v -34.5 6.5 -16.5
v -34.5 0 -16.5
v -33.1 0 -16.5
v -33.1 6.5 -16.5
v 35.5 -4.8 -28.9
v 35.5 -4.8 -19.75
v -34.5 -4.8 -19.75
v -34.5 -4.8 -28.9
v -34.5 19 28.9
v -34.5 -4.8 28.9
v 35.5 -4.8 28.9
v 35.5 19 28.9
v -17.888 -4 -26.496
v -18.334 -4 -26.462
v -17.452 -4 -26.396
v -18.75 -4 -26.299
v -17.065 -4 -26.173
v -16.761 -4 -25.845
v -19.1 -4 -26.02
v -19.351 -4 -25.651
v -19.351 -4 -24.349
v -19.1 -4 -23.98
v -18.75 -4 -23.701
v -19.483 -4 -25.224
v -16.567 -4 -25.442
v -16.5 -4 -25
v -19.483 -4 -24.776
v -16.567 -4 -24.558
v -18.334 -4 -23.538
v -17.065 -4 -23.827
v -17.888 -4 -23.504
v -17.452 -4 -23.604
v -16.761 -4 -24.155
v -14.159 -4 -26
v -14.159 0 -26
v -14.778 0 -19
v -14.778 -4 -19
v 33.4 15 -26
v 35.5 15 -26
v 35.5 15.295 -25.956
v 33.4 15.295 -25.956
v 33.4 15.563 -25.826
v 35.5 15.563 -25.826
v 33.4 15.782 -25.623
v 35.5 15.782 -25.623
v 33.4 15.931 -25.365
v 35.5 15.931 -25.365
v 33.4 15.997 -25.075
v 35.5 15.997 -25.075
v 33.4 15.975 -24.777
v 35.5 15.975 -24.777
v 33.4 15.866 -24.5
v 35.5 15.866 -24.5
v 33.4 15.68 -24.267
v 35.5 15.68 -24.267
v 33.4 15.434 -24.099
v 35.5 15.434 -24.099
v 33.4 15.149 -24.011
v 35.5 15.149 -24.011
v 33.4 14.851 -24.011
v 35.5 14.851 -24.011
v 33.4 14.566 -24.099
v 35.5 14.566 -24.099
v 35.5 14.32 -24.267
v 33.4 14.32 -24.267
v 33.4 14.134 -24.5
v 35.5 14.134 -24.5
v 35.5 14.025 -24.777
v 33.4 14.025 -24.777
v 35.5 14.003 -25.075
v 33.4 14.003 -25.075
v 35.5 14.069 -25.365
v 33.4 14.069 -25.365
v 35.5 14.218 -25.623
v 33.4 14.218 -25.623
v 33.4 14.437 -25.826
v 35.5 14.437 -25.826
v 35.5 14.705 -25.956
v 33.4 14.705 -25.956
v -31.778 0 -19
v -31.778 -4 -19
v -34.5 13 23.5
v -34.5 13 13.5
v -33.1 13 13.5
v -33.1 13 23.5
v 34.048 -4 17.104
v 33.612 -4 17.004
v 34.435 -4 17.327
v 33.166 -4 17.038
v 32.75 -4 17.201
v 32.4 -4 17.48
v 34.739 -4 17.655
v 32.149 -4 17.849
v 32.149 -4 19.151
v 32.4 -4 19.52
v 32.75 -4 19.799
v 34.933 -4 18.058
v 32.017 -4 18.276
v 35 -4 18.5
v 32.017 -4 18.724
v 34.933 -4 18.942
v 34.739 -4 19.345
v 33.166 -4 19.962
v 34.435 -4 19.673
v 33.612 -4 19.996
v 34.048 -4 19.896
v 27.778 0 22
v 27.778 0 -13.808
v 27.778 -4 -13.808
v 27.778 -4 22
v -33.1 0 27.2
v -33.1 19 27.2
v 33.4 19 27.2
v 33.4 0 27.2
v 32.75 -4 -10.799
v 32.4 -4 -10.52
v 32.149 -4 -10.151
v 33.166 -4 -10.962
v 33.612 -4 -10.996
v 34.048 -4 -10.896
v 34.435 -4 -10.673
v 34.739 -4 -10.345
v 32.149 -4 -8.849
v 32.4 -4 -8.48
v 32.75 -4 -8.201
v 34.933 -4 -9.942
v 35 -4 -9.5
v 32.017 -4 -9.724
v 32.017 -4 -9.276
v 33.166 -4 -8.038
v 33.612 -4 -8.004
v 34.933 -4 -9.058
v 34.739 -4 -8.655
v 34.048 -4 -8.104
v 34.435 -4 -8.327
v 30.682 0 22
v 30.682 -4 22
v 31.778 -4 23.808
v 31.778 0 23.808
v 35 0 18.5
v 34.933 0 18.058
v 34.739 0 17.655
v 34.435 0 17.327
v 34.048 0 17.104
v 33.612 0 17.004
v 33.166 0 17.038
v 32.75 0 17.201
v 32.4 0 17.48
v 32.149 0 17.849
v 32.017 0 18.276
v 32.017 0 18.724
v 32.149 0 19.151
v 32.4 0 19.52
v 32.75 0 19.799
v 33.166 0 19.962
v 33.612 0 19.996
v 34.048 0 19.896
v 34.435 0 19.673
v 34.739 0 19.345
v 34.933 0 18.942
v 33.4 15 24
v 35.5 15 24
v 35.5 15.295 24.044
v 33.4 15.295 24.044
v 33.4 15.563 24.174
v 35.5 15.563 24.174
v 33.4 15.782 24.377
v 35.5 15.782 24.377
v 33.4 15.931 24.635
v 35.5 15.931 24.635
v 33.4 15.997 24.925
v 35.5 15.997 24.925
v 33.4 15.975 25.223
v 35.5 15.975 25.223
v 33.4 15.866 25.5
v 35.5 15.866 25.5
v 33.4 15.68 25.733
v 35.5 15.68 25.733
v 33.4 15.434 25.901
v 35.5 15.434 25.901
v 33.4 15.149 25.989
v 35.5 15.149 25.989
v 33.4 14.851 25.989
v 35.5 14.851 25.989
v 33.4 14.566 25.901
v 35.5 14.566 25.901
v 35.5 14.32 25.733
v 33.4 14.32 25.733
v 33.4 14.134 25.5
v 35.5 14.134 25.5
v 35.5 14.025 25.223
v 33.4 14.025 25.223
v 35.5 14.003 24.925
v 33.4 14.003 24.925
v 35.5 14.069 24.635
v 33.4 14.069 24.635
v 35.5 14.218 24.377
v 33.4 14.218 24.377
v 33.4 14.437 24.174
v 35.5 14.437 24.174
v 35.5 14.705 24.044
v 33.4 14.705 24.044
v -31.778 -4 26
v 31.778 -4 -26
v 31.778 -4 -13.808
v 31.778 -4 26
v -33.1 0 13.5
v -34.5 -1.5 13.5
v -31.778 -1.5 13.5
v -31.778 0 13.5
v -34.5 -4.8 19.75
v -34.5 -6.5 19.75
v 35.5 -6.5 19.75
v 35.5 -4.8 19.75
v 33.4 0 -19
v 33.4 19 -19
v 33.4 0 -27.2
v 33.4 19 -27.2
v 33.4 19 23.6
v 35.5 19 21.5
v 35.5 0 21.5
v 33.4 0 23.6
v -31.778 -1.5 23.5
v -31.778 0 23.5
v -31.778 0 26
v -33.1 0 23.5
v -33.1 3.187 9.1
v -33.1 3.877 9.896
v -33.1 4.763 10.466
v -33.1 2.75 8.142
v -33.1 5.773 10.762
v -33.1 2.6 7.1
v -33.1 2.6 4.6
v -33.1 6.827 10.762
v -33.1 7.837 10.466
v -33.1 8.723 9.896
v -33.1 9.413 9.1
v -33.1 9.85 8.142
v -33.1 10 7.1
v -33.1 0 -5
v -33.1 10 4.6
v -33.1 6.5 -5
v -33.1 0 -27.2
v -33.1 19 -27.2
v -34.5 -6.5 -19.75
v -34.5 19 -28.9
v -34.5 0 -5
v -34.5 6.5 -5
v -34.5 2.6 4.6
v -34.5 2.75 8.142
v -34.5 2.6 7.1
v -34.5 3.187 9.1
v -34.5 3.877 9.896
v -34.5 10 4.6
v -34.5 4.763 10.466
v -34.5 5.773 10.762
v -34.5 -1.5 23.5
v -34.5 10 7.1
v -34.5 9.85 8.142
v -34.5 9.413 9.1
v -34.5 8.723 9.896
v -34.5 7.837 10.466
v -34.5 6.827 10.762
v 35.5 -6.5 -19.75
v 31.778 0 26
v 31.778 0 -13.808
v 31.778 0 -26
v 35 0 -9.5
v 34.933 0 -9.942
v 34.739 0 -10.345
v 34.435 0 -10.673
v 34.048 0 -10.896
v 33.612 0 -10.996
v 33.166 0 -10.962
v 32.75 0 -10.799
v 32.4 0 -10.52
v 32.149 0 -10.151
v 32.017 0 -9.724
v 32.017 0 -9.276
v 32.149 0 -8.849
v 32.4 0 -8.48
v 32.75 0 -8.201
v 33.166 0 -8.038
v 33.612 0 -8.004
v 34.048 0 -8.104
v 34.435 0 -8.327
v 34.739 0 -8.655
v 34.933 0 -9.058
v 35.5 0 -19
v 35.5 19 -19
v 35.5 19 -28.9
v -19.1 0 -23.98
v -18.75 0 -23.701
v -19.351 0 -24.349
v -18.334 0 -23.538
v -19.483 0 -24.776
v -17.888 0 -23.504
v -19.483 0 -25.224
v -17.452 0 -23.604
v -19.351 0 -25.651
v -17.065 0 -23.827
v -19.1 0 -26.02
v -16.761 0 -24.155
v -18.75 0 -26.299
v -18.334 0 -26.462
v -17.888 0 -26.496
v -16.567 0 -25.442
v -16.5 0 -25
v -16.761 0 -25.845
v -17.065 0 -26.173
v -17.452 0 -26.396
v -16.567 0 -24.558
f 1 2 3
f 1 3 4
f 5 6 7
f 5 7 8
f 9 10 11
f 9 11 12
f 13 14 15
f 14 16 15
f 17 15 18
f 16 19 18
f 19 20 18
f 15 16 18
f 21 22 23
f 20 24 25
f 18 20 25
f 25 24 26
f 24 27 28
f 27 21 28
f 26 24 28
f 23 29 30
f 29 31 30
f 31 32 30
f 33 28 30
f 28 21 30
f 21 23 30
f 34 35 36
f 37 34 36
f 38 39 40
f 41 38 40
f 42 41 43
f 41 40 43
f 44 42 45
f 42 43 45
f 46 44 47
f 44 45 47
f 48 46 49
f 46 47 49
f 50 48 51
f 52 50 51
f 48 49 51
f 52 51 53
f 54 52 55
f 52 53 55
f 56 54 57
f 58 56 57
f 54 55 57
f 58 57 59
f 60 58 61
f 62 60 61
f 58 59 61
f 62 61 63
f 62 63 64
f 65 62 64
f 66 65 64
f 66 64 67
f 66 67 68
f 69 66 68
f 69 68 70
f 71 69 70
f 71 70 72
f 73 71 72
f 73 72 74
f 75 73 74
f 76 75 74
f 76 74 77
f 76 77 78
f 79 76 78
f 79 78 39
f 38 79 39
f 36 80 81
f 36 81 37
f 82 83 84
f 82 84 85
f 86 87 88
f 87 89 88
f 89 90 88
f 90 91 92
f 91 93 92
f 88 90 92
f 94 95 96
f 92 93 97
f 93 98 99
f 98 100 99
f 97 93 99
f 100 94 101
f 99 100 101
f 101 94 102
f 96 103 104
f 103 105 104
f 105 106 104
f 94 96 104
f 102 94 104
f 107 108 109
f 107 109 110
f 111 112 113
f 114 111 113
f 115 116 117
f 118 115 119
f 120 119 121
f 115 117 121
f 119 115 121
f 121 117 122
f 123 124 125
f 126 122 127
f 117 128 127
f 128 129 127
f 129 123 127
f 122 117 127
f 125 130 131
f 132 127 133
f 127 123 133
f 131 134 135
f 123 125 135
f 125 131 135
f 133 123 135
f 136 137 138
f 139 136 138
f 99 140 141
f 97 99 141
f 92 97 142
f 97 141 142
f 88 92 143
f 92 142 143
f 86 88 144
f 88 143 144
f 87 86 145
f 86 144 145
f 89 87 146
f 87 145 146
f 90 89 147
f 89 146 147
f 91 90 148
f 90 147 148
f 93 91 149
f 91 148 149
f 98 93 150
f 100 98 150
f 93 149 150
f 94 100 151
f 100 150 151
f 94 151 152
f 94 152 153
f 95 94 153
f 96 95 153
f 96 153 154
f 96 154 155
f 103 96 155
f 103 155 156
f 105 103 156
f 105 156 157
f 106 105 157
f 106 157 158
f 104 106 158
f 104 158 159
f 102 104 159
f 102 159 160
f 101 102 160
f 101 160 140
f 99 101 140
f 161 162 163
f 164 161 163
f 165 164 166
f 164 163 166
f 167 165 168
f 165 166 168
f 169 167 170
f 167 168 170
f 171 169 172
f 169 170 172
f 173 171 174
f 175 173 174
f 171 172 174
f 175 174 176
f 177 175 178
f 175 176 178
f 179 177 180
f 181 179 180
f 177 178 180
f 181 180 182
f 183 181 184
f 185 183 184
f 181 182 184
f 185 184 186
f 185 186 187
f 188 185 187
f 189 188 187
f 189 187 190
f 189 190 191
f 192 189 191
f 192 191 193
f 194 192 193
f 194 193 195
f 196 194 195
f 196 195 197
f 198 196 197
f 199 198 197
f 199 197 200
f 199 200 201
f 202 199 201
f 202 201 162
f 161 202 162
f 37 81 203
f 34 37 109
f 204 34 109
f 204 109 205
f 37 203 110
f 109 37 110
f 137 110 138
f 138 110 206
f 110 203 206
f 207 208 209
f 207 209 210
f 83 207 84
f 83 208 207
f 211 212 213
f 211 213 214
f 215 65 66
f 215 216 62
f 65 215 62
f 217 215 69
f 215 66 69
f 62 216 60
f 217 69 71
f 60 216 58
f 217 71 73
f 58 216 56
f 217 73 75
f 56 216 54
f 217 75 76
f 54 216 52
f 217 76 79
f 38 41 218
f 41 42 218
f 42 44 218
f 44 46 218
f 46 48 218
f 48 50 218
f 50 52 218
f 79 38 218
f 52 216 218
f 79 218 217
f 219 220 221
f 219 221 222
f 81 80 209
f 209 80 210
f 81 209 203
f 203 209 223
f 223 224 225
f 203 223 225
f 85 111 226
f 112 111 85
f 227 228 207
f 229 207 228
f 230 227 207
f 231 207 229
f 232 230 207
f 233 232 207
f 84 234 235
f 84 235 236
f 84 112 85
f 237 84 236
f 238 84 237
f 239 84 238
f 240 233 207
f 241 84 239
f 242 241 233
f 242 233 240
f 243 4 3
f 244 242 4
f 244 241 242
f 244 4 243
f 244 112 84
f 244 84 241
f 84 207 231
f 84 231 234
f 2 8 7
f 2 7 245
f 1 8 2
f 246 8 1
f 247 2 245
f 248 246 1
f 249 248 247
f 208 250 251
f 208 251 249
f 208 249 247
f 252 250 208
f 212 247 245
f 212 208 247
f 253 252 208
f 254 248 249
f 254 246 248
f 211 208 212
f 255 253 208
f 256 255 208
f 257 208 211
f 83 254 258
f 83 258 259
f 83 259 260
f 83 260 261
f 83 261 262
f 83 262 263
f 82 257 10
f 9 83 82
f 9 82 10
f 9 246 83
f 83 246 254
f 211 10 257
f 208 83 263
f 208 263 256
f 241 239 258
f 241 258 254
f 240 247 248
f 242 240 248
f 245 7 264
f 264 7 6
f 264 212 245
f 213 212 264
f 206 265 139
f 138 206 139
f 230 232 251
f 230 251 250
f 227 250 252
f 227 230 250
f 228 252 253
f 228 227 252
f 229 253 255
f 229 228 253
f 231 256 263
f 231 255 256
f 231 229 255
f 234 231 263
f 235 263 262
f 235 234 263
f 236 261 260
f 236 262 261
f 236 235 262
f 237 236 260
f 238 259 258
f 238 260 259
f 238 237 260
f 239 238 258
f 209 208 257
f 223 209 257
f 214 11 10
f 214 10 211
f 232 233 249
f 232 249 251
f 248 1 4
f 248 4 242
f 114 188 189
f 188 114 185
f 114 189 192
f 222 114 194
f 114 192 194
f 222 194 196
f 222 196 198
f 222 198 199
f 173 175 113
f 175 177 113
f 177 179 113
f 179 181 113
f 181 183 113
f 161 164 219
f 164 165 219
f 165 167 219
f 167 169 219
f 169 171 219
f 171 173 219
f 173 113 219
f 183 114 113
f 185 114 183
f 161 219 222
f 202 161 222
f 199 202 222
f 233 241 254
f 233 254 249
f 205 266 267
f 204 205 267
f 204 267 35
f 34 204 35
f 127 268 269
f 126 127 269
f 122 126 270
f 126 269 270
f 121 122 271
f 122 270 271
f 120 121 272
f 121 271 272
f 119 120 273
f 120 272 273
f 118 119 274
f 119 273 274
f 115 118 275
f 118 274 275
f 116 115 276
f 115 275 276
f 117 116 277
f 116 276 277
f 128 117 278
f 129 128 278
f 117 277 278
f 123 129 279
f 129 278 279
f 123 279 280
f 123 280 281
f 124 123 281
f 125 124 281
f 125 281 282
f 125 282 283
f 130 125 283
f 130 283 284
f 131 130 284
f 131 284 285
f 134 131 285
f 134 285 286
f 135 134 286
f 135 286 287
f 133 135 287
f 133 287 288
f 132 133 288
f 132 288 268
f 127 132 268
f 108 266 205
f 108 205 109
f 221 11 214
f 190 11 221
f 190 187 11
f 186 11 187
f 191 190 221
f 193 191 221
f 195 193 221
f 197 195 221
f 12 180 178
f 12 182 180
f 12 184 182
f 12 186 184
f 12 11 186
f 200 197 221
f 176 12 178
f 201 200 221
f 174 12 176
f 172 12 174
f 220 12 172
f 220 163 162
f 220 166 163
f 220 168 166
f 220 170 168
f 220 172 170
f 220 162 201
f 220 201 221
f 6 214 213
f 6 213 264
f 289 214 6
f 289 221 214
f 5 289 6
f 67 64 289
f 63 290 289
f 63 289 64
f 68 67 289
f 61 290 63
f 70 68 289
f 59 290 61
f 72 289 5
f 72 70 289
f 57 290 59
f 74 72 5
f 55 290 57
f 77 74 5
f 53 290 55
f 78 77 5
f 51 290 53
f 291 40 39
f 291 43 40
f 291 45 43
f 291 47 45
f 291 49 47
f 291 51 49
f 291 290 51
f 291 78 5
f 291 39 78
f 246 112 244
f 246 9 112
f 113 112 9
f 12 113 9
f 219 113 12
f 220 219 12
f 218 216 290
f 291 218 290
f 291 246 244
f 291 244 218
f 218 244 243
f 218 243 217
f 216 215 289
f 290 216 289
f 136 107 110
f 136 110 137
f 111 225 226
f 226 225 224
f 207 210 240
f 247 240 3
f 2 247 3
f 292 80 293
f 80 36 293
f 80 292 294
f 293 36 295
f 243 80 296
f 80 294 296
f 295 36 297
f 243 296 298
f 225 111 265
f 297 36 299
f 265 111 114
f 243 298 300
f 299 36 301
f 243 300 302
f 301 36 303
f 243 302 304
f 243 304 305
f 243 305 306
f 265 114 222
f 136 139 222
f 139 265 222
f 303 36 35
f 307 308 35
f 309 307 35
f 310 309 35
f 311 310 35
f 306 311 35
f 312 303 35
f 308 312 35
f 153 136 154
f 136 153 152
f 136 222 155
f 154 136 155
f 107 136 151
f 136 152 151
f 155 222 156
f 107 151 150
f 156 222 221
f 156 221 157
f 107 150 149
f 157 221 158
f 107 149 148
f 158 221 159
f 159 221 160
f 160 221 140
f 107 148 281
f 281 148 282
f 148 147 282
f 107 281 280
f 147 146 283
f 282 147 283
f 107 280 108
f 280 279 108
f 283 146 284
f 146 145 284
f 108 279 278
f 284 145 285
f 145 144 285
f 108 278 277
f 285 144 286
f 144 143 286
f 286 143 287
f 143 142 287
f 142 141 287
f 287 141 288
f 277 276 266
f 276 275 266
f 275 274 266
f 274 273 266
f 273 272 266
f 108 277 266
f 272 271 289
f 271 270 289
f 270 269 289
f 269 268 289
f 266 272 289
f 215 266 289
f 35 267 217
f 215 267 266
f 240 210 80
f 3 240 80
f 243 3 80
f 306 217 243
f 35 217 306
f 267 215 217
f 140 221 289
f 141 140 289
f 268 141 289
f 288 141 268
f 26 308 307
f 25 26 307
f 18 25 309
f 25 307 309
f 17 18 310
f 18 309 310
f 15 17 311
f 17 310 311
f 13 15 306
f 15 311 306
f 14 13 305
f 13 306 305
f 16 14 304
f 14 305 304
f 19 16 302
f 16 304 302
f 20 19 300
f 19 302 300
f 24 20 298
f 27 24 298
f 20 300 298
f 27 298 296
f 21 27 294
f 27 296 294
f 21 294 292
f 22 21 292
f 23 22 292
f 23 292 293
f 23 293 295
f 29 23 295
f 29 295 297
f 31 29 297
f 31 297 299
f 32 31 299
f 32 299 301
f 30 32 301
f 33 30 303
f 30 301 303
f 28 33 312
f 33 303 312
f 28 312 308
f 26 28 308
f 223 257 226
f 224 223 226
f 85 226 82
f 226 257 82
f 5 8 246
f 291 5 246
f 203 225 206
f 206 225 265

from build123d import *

# Parameters (mm, degrees)
EXTRUDE_1_DEPTH      = 4
SKETCH_3_W           = 73
SKETCH_3_H           = 58
EXTRUDE_2_DEPTH      = 13
EXTRUDE_2_DEPTH_BACK = 4
SKETCH_4_W           = 17
SKETCH_4_H           = 7
EXTRUDE_4_DEPTH      = 4
SKETCH_5_R           = 1.5
CUT_EXTRUDE_1_DEPTH  = 4
EXTRUDE_5_DEPTH      = 4
EXTRUDE_6_DEPTH      = 4
SKETCH_8_W           = 73
SKETCH_8_H           = 58
EXTRUDE_7_DEPTH      = 1
SKETCH_9_W           = 8.5
SKETCH_9_H           = 3.5
CUT_EXTRUDE_2_DEPTH  = 2
CHAMFER_1_SIZE       = 0.5
SKETCH_10_W          = 9
SKETCH_10_H          = 12
CUT_EXTRUDE_3_DEPTH  = 2
CHAMFER_2_SIZE       = 0.5
CHAMFER_3_SIZE       = 0.5
CHAMFER_4_SIZE       = 0.5
CUT_EXTRUDE_4_DEPTH  = 2
CHAMFER_5_SIZE       = 0.5
CHAMFER_6_SIZE       = 0.5
SKETCH_21_W          = 2
SKETCH_21_H          = 58
CUT_EXTRUDE_5_DEPTH  = 19
CUT_EXTRUDE_7_DEPTH  = 13
EXTRUDE_8_DEPTH      = 6
SKETCH_36_W          = 71
SKETCH_36_H          = 39.5
EXTRUDE_9_DEPTH      = 1.5
SKETCH_39_R          = 1
CUT_EXTRUDE_9_DEPTH  = 5
SKETCH_42_W          = 9.25
SKETCH_42_H          = 0.2
CUT_EXTRUDE_10_DEPTH = 72
SKETCH_43_W          = 0.1
SKETCH_43_H          = 23.8
CUT_EXTRUDE_11_DEPTH = 72
CUT_EXTRUDE_12_DEPTH = 0.5
CUT_EXTRUDE_13_DEPTH = 0.5
SKETCH_46_W          = 66.5
SKETCH_46_H          = 54.4
SKETCH_46_W_2        = 66
SKETCH_46_H_2        = 54
CUT_EXTRUDE_14_DEPTH = 19
SKETCH_47_W          = 11.5
SKETCH_47_H          = 6.5
SKETCH_47_W_2        = 8.5
SKETCH_47_H_2        = 3.5
CUT_EXTRUDE_16_DEPTH = 7.5
CUT_EXTRUDE_17_DEPTH = 7.5
SKETCH_51_W          = 10
SKETCH_51_H          = 14.5
SKETCH_51_W_2        = 7.5
SKETCH_51_H_2        = 12
CUT_EXTRUDE_18_DEPTH = 7.5


with BuildPart() as part:
    # 草图1 → 凸台-拉伸1 (new body)
    with BuildSketch(Plane(origin=(0, 0, 0), x_dir=(1, 0, 0), z_dir=(0, 1, 0))):
        Polygon((33, -27), (-33, -27), (-33, 27), (33, 27), (33, 14), (36, 11), (36, -21), (33, -24), align=None)
        Polygon((-31.777777778, 26), (-31.777777778, -26), (31.777777778, -26), (31.777777778, -23.80800866), (35, -20.585786438), (35, 9.543812347), (35, 10.585786438), (31.777777778, 13.80800866), (31.777777778, 26), align=None, mode=Mode.SUBTRACT)
    extrude(amount=-EXTRUDE_1_DEPTH)

    # 草图3 → 凸台-拉伸2 (add, two sides)
    with BuildSketch(Plane(origin=(0, 0, 0), x_dir=(1, 0, 0), z_dir=(0, 1, 0))) as extrude_2_sk:
        with Locations((1.5, 0)):
            Rectangle(SKETCH_3_W, SKETCH_3_H)
        Polygon((33, 27), (33, 14), (36, 11), (36, -21), (33, -24), (33, -27), (-33, -27), (-33, 27), align=None, mode=Mode.SUBTRACT)
    extrude(amount=EXTRUDE_2_DEPTH)
    extrude(extrude_2_sk.sketch, amount=-EXTRUDE_2_DEPTH_BACK)

    # 草图4 → 凸台-拉伸4 (add)
    with BuildSketch(Plane(origin=(0, 0, 0), x_dir=(1, 0, 0), z_dir=(0, 1, 0))):
        with Locations((-23.277777778, 22.5)):
            Rectangle(SKETCH_4_W, SKETCH_4_H)
        Polygon((31.777777778, 13.80800866), (27.777777778, 13.80800866), (27.777777778, -22), (33.585786438, -22), (35, -20.585786438), (35, 10.585786438), align=None)
    extrude(amount=-EXTRUDE_4_DEPTH)

    # 草图5 → 切除-拉伸1 (cut)
    with BuildSketch(Plane(origin=(0, 0, 0), x_dir=(1, 0, 0), z_dir=(0, 1, 0))):
        with Locations((-18, 25)):
            Circle(SKETCH_5_R)
        with Locations((33.5, 9.5)):
            Circle(SKETCH_5_R)
        with Locations((33.5, -18.5)):
            Circle(SKETCH_5_R)
    extrude(amount=-CUT_EXTRUDE_1_DEPTH, mode=Mode.SUBTRACT)

    # 草图6 → 凸台-拉伸5 (add)
    with BuildSketch(Plane.XZ.offset(4)):
        Polygon((31.777777778, 23.80800866), (33.585786438, 22), (30.681782108, 22), align=None)
    extrude(amount=-EXTRUDE_5_DEPTH)

    # 草图7 → 凸台-拉伸6 (add)
    with BuildSketch(Plane(origin=(0, 0, 0), x_dir=(1, 0, 0), z_dir=(0, 1, 0))):
        Polygon((-14.158955627, 26), (-14.777777778, 19), (-14.777777778, 26), align=None)
    extrude(amount=-EXTRUDE_6_DEPTH)

    # 草图8 → 凸台-拉伸7 (add)
    with BuildSketch(Plane.XZ.offset(4)):
        with Locations((1.5, 0)):
            Rectangle(SKETCH_8_W, SKETCH_8_H)
    extrude(amount=EXTRUDE_7_DEPTH)

    # 草图9 → 切除-拉伸2 (cut)
    with BuildSketch(Plane(origin=(-33, 0, 0), x_dir=(0, 0, -1), z_dir=(1, 0, 0))):
        with Locations((10.25, 2.75)):
            Rectangle(SKETCH_9_W, SKETCH_9_H)
    extrude(amount=-CUT_EXTRUDE_2_DEPTH, mode=Mode.SUBTRACT)

    # 倒角1
    chamfer_1_edges = [part.edges().sort_by_distance(p)[0] for p in [
        (-35, 4.5, -10.25),
        (-35, 2.75, -14.5),
        (-35, 1, -10.25),
        (-35, 2.75, -6),
    ]]
    chamfer(chamfer_1_edges, length=CHAMFER_1_SIZE)

    # 草图10 → 切除-拉伸3 (cut)
    with BuildSketch(Plane(origin=(-33, 0, 0), x_dir=(0, 0, -1), z_dir=(1, 0, 0))):
        with Locations((-18.5, 6)):
            Rectangle(SKETCH_10_W, SKETCH_10_H)
    extrude(amount=-CUT_EXTRUDE_3_DEPTH, mode=Mode.SUBTRACT)

    # 倒角2
    chamfer_2_edges = [part.edges().sort_by_distance(p)[0] for p in [
        (-35, 6, 23),
        (-35, 12, 18.5),
        (-35, 6, 14),
        (-35, 0, 18.5),
    ]]
    chamfer(chamfer_2_edges, length=CHAMFER_2_SIZE)

    # 倒角3
    chamfer_3_edges = [part.edges().sort_by_distance(p)[0] for p in [
        (-33, 4.5, -10.25),
        (-33, 1, -10.25),
        (-33, 12, 18.5),
    ]]
    chamfer(chamfer_3_edges, length=CHAMFER_3_SIZE)

    # 倒角4
    chamfer_4_edges = [part.edges().sort_by_distance(p)[0] for p in [
        (-33, 6, 14),
        (-33, 6, 23),
        (-33, 2.75, -6),
        (-33, 2.75, -14.5),
    ]]
    chamfer(chamfer_4_edges, length=CHAMFER_4_SIZE)

    # 草图13 → 切除-拉伸4 (cut)
    with BuildSketch(Plane(origin=(-33, 0, 0), x_dir=(0, 0, -1), z_dir=(1, 0, 0))):
        with BuildLine():
            Line((-6, 8.6), (-7.1, 8.6))
            ThreePointArc((-7.1, 8.6), (-9.4, 6.3), (-7.1, 4))
            Line((-7.1, 4), (-6, 4))
            Line((-6, 4), (-6, 8.6))
        make_face()
    extrude(amount=-CUT_EXTRUDE_4_DEPTH, mode=Mode.SUBTRACT)

    # 倒角5
    chamfer_5_edges = [part.edges().sort_by_distance(p)[0] for p in [
        (-35, 6.3, 6),
        (-35, 4, 6.55),
        (-35, 6.3, 9.4),
        (-35, 8.6, 6.55),
    ]]
    chamfer(chamfer_5_edges, length=CHAMFER_5_SIZE)

    # 倒角6
    chamfer_6_edges = [part.edges().sort_by_distance(p)[0] for p in [
        (-33, 6.3, 6),
        (-33, 8.6, 6.55),
        (-33, 6.3, 9.4),
        (-33, 4, 6.55),
    ]]
    chamfer(chamfer_6_edges, length=CHAMFER_6_SIZE)

    # 草图21 → 切除-拉伸5 (cut, through all)
    with BuildSketch(Plane(origin=(0, 13, 0), x_dir=(1, 0, 0), z_dir=(0, 1, 0))):
        with Locations((37, 0)):
            Rectangle(SKETCH_21_W, SKETCH_21_H)
    extrude(amount=-CUT_EXTRUDE_5_DEPTH, mode=Mode.SUBTRACT)

    # 草图23 → 切除-拉伸7 (cut)
    with BuildSketch(Plane(origin=(0, 13, 0), x_dir=(1, 0, 0), z_dir=(0, 1, 0))):
        Polygon((33, 14), (33, 19), (36, 19), (36, 11), align=None)
    extrude(amount=-CUT_EXTRUDE_7_DEPTH, mode=Mode.SUBTRACT)

    # 草图27 → 凸台-拉伸8 (add)
    with BuildSketch(Plane(origin=(0, 13, 0), x_dir=(1, 0, 0), z_dir=(0, 1, 0))):
        Polygon((33, 19), (36, 19), (36, 29), (-35, 29), (-35, -29), (36, -29), (36, -21), (33, -24), (33, -27), (-33, -27), (-33, 27), (33, 27), align=None)
    extrude(amount=EXTRUDE_8_DEPTH)

    # 草图36 → 凸台-拉伸9 (add)
    with BuildSketch(Plane.XZ.offset(5)):
        with Locations((0.5, 0)):
            Rectangle(SKETCH_36_W, SKETCH_36_H)
    extrude(amount=EXTRUDE_9_DEPTH)

    # 草图39 → 切除-拉伸9 (cut)
    with BuildSketch(Plane(origin=(36, 0, 0), x_dir=(0, 0, -1), z_dir=(1, 0, 0))):
        with Locations((-25, 15)):
            Circle(SKETCH_39_R)
        with Locations((25, 15)):
            Circle(SKETCH_39_R)
    extrude(amount=-CUT_EXTRUDE_9_DEPTH, mode=Mode.SUBTRACT)

    # 草图42 → 切除-拉伸10 (cut, through all)
    with BuildSketch(Plane(origin=(36, 0, 0), x_dir=(0, 0, -1), z_dir=(1, 0, 0))):
        with Locations((-24.375, -4.9)):
            Rectangle(SKETCH_42_W, SKETCH_42_H)
        with Locations((24.375, -4.9)):
            Rectangle(SKETCH_42_W, SKETCH_42_H)
    extrude(amount=-CUT_EXTRUDE_10_DEPTH, mode=Mode.SUBTRACT)

    # 草图43 → 切除-拉伸11 (cut, through all)
    with BuildSketch(Plane(origin=(36, 0, 0), x_dir=(0, 0, -1), z_dir=(1, 0, 0))):
        with Locations((-28.95, 7.1)):
            Rectangle(SKETCH_43_W, SKETCH_43_H)
        with Locations((28.95, 7.1)):
            Rectangle(SKETCH_43_W, SKETCH_43_H)
    extrude(amount=-CUT_EXTRUDE_11_DEPTH, mode=Mode.SUBTRACT)

    # 草图44 → 切除-拉伸12 (cut)
    with BuildSketch(Plane(origin=(36, 0, 0), x_dir=(0, 0, -1), z_dir=(1, 0, 0))):
        Polygon((19.75, -4.8), (28.9, -4.8), (28.9, 19), (19, 19), (19, 0), (-21, 0), (-21, 19), (-28.9, 19), (-28.9, -4.8), (-19.75, -4.8), (-19.75, -6.5), (19.75, -6.5), align=None)
    extrude(amount=-CUT_EXTRUDE_12_DEPTH, mode=Mode.SUBTRACT)

    # 草图45 → 切除-拉伸13 (cut)
    with BuildSketch(Plane.ZY.offset(35)):
        Polygon((28.9, 19), (-28.9, 19), (-28.9, -4.8), (-19.75, -4.8), (-19.75, -6.5), (19.75, -6.5), (19.75, -4.8), (28.9, -4.8), align=None)
    extrude(amount=-CUT_EXTRUDE_13_DEPTH, mode=Mode.SUBTRACT)

    # 草图46 → 切除-拉伸14 (cut)
    with BuildSketch(Plane(origin=(0, 19, 0), x_dir=(1, 0, 0), z_dir=(0, 1, 0))):
        with Locations((0.15, 0)):
            Rectangle(SKETCH_46_W, SKETCH_46_H)
        Rectangle(SKETCH_46_W_2, SKETCH_46_H_2, mode=Mode.SUBTRACT)
    extrude(amount=-CUT_EXTRUDE_14_DEPTH, mode=Mode.SUBTRACT)

    # 草图47 → 切除-拉伸16 (cut)
    with BuildSketch(Plane.ZY.offset(34.5)):
        with Locations((-10.75, 3.25)):
            Rectangle(SKETCH_47_W, SKETCH_47_H)
        with Locations((-10.25, 2.75)):
            Rectangle(SKETCH_47_W_2, SKETCH_47_H_2, mode=Mode.SUBTRACT)
    extrude(amount=-CUT_EXTRUDE_16_DEPTH, mode=Mode.SUBTRACT)

    # 草图48 → 切除-拉伸17 (cut)
    with BuildSketch(Plane(origin=(-33.1, 0, 0), x_dir=(0, 0, -1), z_dir=(1, 0, 0))):
        with BuildLine():
            Line((-7.1, 10), (-5.6, 10))
            Line((-5.6, 10), (-4.6, 10))
            Line((-4.6, 10), (-4.6, 2.6))
            Line((-4.6, 2.6), (-5.6, 2.6))
            Line((-5.6, 2.6), (-7.1, 2.6))
            ThreePointArc((-7.1, 2.6), (-10.8, 6.3), (-7.1, 10))
        make_face()
    extrude(amount=-CUT_EXTRUDE_17_DEPTH, mode=Mode.SUBTRACT)

    # 草图51 → 切除-拉伸18 (cut)
    with BuildSketch(Plane.ZY.offset(34.5)):
        with Locations((18.5, 5.75)):
            Rectangle(SKETCH_51_W, SKETCH_51_H)
        with Locations((17.75, 6)):
            Rectangle(SKETCH_51_W_2, SKETCH_51_H_2, mode=Mode.SUBTRACT)
    extrude(amount=-CUT_EXTRUDE_18_DEPTH, mode=Mode.SUBTRACT)


solid = part.part
